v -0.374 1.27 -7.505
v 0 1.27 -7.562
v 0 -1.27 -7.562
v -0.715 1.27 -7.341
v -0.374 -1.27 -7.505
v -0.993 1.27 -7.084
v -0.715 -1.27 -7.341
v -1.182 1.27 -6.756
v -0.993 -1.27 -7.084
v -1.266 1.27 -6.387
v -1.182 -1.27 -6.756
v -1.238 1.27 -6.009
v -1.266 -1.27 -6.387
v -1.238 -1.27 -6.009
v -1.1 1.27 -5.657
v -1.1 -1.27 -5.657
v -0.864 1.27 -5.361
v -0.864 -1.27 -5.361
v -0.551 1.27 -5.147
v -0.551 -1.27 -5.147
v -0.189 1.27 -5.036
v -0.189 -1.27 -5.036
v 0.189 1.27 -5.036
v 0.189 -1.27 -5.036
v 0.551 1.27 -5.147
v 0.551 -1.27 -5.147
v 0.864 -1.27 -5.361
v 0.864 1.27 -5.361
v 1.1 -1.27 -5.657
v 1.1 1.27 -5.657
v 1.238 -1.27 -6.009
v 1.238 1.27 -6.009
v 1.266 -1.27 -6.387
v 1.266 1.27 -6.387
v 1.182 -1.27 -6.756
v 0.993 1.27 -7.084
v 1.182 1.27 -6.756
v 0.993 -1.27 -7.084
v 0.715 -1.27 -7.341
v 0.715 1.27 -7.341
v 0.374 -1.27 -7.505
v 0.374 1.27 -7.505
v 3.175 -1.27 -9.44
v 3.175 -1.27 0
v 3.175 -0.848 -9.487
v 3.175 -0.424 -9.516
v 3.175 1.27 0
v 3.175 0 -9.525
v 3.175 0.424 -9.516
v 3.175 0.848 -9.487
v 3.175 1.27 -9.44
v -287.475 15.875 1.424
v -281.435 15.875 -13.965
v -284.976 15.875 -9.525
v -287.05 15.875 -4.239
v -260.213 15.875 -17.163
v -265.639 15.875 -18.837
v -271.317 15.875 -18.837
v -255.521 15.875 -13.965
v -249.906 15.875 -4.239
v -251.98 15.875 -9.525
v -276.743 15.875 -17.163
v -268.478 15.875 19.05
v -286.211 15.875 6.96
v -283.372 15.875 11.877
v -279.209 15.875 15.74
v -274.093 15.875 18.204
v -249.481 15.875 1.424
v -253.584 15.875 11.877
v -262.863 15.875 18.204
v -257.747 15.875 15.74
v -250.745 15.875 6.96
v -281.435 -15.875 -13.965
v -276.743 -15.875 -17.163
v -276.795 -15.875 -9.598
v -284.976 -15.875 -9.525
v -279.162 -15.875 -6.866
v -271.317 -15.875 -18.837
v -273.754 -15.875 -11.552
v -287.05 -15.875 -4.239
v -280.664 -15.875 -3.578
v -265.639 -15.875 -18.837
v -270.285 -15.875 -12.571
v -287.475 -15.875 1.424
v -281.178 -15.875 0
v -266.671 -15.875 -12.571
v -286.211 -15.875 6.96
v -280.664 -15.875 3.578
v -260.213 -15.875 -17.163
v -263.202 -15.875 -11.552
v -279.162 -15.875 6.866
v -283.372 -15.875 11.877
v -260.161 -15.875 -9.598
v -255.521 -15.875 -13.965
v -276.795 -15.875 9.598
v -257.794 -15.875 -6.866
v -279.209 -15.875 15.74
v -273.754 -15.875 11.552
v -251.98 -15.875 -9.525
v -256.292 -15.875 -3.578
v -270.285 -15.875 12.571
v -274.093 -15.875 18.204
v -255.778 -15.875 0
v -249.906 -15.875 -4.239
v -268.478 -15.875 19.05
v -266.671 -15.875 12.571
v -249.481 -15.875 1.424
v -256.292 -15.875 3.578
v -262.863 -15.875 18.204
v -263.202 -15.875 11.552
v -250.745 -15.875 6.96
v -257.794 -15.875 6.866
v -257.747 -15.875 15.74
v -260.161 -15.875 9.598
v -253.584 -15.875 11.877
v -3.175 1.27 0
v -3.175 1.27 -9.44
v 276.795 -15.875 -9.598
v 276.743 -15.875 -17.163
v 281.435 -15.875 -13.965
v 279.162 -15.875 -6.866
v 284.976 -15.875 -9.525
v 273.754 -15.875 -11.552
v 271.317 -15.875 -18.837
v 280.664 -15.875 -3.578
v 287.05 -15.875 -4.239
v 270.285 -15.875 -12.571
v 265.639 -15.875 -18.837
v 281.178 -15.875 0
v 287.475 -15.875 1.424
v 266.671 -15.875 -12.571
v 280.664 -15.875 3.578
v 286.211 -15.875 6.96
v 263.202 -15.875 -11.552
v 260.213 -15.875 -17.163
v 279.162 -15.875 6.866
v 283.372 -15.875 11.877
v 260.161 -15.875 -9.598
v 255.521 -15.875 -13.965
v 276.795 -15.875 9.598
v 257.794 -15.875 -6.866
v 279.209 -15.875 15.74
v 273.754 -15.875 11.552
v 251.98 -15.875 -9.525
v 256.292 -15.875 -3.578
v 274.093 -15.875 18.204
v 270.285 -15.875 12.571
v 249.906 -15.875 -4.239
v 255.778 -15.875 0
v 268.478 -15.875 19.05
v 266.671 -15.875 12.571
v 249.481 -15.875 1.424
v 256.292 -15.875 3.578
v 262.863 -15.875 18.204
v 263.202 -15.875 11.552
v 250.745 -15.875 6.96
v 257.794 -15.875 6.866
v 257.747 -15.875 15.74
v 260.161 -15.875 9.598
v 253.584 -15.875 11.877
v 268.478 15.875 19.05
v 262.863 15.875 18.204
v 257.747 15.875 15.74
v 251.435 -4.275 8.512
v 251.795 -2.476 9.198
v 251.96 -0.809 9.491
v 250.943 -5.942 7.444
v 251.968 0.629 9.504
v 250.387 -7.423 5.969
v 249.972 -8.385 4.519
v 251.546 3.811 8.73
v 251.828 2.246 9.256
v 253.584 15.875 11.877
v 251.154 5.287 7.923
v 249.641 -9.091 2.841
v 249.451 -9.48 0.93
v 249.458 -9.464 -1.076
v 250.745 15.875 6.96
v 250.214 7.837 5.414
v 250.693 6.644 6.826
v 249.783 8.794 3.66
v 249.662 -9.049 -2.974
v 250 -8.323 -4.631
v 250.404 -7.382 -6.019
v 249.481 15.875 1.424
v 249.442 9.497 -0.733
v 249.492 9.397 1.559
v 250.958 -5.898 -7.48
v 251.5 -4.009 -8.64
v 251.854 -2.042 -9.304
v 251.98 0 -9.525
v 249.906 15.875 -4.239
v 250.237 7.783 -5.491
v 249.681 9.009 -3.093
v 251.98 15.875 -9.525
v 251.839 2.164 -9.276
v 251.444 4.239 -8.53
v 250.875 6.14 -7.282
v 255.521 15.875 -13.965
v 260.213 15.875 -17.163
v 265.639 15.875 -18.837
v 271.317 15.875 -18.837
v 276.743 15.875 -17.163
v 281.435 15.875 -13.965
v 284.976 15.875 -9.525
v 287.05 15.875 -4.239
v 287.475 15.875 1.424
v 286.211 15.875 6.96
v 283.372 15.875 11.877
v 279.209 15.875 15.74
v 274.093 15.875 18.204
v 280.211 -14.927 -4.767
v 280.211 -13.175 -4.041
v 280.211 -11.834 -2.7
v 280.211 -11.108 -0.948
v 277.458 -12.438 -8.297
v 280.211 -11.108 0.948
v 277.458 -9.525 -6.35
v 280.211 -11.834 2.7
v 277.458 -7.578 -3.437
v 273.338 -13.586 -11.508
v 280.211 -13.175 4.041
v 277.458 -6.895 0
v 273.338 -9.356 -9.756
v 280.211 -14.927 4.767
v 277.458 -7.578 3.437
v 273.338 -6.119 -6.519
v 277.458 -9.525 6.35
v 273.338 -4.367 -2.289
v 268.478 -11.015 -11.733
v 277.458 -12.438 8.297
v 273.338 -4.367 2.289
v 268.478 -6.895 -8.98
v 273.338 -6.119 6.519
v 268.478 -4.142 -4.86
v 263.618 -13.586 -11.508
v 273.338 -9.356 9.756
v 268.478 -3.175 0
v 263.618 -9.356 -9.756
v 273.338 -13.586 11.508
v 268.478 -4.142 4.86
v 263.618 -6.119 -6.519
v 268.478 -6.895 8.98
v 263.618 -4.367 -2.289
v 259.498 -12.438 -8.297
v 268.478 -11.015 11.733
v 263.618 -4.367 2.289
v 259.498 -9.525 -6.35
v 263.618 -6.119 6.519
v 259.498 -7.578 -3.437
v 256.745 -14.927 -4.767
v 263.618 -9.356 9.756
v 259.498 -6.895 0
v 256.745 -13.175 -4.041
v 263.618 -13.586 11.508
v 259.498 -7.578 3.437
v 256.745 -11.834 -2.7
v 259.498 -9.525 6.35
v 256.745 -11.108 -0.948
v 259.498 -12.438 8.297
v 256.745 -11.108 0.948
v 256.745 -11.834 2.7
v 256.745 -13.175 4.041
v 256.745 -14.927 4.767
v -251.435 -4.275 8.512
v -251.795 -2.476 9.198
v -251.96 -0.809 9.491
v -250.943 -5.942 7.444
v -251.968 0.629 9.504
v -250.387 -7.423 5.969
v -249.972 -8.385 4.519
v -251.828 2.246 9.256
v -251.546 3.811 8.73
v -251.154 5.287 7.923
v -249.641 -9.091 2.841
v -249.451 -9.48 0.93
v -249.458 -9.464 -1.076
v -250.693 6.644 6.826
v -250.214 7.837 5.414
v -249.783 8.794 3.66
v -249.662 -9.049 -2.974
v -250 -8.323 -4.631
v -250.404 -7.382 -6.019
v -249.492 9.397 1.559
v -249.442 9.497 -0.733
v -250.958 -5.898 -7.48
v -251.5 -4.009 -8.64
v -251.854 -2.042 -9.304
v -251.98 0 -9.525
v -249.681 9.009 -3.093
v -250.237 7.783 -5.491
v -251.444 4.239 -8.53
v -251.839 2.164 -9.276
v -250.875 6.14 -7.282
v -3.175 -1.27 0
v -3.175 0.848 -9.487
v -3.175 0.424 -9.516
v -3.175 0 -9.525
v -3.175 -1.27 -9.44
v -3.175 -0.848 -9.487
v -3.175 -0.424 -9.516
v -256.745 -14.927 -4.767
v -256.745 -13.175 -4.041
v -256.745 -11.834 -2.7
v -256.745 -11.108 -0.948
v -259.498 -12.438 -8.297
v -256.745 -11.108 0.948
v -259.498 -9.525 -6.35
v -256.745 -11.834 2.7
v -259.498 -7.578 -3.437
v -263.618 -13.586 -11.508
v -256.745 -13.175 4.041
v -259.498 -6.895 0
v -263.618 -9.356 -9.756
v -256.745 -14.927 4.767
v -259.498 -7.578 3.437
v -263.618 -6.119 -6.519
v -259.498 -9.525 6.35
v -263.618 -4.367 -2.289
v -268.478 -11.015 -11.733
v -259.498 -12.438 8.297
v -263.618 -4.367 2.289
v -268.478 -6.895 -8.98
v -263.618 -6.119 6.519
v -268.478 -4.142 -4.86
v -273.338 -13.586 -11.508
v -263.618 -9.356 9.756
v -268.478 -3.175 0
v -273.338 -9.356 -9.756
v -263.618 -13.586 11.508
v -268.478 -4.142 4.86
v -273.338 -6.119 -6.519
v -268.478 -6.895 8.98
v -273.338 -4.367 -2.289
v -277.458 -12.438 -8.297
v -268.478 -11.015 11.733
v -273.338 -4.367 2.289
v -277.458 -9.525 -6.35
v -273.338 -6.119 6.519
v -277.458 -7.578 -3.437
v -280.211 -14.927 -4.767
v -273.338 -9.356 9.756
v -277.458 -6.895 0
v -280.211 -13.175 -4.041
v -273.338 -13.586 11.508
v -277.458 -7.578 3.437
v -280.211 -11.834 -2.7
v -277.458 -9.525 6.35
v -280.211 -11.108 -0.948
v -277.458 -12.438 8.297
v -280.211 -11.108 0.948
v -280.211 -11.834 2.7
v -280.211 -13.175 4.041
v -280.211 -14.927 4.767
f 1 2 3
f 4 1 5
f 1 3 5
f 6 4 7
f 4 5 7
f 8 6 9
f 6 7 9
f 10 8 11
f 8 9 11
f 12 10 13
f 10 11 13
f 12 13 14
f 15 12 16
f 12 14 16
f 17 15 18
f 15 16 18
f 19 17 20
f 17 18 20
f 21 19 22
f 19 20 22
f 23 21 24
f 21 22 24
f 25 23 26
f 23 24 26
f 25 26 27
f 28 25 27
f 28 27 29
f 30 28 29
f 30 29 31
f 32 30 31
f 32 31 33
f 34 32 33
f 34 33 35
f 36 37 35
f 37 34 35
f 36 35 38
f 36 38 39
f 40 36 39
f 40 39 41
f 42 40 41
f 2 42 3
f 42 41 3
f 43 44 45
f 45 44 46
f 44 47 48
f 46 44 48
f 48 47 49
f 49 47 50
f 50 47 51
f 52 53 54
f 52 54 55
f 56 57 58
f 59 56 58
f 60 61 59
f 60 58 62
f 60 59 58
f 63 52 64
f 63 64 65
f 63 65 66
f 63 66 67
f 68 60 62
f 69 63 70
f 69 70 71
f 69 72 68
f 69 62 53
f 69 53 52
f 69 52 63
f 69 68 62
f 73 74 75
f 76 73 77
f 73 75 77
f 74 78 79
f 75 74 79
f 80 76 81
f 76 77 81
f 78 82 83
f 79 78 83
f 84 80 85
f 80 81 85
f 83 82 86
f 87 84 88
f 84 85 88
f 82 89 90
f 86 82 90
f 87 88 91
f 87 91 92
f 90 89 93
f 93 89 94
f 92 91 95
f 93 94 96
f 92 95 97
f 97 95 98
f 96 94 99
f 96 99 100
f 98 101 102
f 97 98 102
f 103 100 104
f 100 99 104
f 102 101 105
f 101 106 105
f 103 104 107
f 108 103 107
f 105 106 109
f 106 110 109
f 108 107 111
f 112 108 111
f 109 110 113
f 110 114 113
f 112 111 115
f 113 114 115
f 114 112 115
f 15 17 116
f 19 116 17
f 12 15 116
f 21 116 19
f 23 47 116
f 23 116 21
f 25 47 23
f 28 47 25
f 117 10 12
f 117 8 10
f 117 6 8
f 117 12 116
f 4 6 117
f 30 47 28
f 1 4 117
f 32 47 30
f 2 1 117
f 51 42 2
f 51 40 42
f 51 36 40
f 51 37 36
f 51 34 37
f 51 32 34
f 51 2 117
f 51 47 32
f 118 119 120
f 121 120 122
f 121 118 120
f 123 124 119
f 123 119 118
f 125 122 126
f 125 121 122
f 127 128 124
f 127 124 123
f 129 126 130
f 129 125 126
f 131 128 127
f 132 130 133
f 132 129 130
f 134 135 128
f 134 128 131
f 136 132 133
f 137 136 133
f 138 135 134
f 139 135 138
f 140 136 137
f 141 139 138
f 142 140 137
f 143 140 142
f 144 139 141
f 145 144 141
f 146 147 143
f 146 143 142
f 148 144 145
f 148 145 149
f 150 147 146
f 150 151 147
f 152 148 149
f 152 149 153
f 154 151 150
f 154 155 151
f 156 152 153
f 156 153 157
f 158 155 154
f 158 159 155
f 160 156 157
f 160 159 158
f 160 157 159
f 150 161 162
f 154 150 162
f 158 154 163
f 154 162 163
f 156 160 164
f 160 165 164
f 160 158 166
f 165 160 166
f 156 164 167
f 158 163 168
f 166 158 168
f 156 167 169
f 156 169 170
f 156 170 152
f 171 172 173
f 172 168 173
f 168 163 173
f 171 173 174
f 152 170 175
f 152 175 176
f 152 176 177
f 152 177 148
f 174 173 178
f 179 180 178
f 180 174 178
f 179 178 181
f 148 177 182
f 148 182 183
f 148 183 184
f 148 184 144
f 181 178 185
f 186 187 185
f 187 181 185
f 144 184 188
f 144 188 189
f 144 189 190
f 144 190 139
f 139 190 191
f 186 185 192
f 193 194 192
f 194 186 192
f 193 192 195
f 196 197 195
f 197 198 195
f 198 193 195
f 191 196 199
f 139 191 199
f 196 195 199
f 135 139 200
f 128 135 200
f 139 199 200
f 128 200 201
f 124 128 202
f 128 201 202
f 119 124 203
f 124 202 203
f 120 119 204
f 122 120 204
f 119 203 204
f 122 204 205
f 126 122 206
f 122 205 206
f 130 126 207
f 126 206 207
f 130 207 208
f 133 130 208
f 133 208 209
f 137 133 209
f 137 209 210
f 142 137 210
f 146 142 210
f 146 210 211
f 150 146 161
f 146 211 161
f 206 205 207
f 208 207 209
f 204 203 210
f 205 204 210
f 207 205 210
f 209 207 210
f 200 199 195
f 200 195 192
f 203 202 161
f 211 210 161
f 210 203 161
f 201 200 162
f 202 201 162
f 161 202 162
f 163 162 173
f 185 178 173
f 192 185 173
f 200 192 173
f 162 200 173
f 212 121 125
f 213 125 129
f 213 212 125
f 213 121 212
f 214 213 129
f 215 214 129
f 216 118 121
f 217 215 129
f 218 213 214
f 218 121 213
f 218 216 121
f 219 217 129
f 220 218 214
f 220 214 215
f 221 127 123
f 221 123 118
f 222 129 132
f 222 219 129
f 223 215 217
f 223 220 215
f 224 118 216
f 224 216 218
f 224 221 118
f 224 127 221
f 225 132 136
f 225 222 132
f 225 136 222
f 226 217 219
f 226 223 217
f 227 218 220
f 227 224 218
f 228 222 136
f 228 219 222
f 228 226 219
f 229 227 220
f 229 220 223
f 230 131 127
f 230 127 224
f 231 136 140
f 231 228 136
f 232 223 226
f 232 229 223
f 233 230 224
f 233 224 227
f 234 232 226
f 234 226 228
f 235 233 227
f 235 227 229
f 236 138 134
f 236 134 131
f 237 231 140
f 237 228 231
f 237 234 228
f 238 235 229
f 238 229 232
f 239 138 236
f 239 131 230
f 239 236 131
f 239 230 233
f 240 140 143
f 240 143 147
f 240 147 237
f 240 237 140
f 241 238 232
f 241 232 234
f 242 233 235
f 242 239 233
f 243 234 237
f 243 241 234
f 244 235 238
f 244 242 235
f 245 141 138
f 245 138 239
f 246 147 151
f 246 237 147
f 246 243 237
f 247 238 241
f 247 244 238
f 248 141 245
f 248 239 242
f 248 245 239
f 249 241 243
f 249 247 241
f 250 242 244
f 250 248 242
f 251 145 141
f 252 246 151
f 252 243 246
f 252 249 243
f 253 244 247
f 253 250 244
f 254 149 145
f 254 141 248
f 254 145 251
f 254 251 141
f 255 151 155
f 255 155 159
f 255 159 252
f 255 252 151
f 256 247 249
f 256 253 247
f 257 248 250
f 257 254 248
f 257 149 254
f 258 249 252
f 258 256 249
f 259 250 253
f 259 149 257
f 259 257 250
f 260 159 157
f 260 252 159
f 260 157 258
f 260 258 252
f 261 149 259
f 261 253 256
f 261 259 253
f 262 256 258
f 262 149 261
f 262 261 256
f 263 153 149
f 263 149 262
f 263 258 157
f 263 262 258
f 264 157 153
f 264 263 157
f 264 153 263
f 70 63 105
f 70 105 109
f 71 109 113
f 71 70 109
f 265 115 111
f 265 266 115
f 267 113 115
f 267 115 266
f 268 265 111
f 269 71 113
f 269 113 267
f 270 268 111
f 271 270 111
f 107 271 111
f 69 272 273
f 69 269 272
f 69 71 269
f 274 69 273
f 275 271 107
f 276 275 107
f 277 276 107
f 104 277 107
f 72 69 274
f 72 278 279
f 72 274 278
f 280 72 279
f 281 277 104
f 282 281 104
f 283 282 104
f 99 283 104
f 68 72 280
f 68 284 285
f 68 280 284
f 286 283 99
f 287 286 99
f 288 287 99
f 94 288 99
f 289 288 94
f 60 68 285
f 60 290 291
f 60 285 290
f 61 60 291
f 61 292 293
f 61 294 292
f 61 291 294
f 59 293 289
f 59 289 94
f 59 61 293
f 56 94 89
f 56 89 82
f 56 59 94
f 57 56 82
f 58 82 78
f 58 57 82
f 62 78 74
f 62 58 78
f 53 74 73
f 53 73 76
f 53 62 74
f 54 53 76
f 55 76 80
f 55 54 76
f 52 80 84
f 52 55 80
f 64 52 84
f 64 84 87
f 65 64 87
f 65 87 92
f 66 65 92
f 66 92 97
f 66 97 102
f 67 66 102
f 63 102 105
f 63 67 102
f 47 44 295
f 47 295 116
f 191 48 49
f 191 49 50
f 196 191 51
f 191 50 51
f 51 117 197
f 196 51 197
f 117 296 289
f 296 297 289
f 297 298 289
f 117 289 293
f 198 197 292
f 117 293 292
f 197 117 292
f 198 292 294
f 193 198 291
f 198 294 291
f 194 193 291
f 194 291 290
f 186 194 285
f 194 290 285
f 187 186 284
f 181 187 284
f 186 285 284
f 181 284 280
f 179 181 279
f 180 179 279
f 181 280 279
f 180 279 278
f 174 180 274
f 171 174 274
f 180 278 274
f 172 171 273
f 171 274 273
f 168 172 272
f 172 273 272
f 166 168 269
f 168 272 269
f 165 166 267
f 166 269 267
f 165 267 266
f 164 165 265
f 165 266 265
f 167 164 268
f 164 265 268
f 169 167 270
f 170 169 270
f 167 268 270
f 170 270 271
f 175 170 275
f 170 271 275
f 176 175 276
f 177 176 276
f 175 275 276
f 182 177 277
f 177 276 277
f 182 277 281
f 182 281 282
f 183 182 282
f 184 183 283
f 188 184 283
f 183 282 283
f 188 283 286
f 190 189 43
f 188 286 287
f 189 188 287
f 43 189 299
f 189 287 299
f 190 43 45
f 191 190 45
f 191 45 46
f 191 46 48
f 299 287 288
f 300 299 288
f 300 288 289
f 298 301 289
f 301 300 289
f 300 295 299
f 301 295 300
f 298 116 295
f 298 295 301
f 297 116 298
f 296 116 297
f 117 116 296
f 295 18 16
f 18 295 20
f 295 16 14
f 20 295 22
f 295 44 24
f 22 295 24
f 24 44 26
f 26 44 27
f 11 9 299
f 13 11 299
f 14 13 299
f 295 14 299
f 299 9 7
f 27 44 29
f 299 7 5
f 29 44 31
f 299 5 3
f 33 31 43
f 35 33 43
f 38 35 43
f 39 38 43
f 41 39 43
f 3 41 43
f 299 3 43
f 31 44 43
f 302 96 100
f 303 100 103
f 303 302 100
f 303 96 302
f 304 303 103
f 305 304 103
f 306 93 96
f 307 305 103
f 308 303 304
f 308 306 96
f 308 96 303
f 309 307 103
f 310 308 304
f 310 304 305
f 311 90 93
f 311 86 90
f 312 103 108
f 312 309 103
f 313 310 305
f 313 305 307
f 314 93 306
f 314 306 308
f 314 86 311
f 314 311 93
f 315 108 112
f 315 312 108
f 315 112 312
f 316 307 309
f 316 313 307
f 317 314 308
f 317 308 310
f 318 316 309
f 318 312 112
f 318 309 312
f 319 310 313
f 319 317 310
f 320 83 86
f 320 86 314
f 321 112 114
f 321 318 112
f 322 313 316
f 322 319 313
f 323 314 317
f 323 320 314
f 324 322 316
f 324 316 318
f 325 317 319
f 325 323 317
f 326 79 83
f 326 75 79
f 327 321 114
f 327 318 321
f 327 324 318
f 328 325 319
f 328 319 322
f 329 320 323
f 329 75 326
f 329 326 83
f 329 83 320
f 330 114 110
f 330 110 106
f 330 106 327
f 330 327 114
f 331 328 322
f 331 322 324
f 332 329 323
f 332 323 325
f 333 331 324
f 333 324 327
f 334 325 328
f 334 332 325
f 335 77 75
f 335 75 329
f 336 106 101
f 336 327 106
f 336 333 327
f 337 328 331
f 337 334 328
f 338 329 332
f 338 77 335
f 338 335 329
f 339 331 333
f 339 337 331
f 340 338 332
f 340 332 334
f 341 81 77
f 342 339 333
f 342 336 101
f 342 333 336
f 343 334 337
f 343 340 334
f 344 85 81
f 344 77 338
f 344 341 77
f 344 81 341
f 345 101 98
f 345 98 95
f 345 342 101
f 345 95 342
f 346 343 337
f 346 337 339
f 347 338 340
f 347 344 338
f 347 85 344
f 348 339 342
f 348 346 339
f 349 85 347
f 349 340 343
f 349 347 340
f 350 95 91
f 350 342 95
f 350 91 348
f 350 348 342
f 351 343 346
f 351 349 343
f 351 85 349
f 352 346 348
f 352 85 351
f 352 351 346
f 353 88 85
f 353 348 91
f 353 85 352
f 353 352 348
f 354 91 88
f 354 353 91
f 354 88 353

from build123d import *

# Parameters (mm, degrees)
SKETCH1_R                = 19.05
BOSS_EXTRUDE1_DEPTH      = 15.875
BOSS_EXTRUDE2_REACH      = 290.595
BOSS_EXTRUDE2_END_RADIUS = 19.05
SKETCH3_R                = 9.525
SKETCH5_W                = 13.407996618
SKETCH5_H                = 2.54
CUT_EXTRUDE2_DEPTH       = 3.175
BOSS_EXTRUDE3_REACH      = 290.668
SKETCH6_R                = 1.27


with BuildPart() as part:
    # Sketch1 → Boss-Extrude1 (new, symmetric)
    with BuildSketch(Plane(origin=(0, 0, 0), x_dir=(1, 0, 0), z_dir=(0, 1, 0))):
        with Locations(Location((-268.478, 0, 0), (0, 0, 270))):
            Circle(SKETCH1_R)
    extrude(amount=BOSS_EXTRUDE1_DEPTH, both=True)

    # Boss-Extrude2: up to this cylinder (the profile starts outside it)
    boss_extrude2_end = Plane(origin=(-268.478, 0, 0), z_dir=(0, -1, 0)) * Cylinder(BOSS_EXTRUDE2_END_RADIUS, 620.29, mode=Mode.PRIVATE)
    # Sketch3 → Boss-Extrude2 (add, up to the surface)
    with BuildSketch(Plane(origin=(0, 0, 0), x_dir=(0, 0, -1), z_dir=(1, 0, 0)), mode=Mode.PRIVATE) as boss_extrude2_sk1:
        Circle(SKETCH3_R)
    boss_extrude2_tool1 = extrude(boss_extrude2_sk1.sketch, amount=-BOSS_EXTRUDE2_REACH, mode=Mode.PRIVATE) - boss_extrude2_end
    add(boss_extrude2_tool1.solids().sort_by_distance((0, 0, 0))[0])

    # Mirror3: part across plane


with BuildPart() as part_1:
    add(part.part)
    add(part.part.mirror(Plane(origin=(0, 0, 0), x_dir=(0, 0, 1), z_dir=(1, 0, 0))))

    # Sketch4 → Cut-Revolve1 (revolve, cut)
    with BuildSketch(Plane.XZ.offset(15.875)):
        with BuildLine():
            Line((-281.178, 0), (-255.778, 0))
            ThreePointArc((-255.778, 0), (-268.478, 12.7), (-281.178, 0))
        make_face()
        with BuildLine():
            Line((255.778, 0), (281.178, 0))
            ThreePointArc((281.178, 0), (268.478, 12.7), (255.778, 0))
        make_face()
    revolve(axis=Axis((-37.36850349, -15.875, 0), (1, 0, 0)), mode=Mode.SUBTRACT)

    # Sketch5 → Cut-Extrude2 (cut, symmetric)
    with BuildSketch(Plane(origin=(0, 0, 0), x_dir=(0, 0, -1), z_dir=(1, 0, 0))):
        with Locations((6.703998309, 0)):
            Rectangle(SKETCH5_W, SKETCH5_H)
    extrude(amount=CUT_EXTRUDE2_DEPTH, both=True, mode=Mode.SUBTRACT)

    # Sketch6 → Boss-Extrude3 (add, up to next)
    with BuildSketch(Plane(origin=(0, -1.27, 0), x_dir=(1, 0, 0), z_dir=(0, 1, 0)), mode=Mode.PRIVATE) as boss_extrude3_sk1:
        with Locations(Location((0, 6.291669235, 0), (0, 0, 90))):
            Circle(SKETCH6_R)
    boss_extrude3_tool1 = extrude(boss_extrude3_sk1.sketch, amount=BOSS_EXTRUDE3_REACH, mode=Mode.PRIVATE) - part_1.part
    add(boss_extrude3_tool1.solids().sort_by_distance((0, -1.27, -6.291669))[0])


solid = part_1.part
